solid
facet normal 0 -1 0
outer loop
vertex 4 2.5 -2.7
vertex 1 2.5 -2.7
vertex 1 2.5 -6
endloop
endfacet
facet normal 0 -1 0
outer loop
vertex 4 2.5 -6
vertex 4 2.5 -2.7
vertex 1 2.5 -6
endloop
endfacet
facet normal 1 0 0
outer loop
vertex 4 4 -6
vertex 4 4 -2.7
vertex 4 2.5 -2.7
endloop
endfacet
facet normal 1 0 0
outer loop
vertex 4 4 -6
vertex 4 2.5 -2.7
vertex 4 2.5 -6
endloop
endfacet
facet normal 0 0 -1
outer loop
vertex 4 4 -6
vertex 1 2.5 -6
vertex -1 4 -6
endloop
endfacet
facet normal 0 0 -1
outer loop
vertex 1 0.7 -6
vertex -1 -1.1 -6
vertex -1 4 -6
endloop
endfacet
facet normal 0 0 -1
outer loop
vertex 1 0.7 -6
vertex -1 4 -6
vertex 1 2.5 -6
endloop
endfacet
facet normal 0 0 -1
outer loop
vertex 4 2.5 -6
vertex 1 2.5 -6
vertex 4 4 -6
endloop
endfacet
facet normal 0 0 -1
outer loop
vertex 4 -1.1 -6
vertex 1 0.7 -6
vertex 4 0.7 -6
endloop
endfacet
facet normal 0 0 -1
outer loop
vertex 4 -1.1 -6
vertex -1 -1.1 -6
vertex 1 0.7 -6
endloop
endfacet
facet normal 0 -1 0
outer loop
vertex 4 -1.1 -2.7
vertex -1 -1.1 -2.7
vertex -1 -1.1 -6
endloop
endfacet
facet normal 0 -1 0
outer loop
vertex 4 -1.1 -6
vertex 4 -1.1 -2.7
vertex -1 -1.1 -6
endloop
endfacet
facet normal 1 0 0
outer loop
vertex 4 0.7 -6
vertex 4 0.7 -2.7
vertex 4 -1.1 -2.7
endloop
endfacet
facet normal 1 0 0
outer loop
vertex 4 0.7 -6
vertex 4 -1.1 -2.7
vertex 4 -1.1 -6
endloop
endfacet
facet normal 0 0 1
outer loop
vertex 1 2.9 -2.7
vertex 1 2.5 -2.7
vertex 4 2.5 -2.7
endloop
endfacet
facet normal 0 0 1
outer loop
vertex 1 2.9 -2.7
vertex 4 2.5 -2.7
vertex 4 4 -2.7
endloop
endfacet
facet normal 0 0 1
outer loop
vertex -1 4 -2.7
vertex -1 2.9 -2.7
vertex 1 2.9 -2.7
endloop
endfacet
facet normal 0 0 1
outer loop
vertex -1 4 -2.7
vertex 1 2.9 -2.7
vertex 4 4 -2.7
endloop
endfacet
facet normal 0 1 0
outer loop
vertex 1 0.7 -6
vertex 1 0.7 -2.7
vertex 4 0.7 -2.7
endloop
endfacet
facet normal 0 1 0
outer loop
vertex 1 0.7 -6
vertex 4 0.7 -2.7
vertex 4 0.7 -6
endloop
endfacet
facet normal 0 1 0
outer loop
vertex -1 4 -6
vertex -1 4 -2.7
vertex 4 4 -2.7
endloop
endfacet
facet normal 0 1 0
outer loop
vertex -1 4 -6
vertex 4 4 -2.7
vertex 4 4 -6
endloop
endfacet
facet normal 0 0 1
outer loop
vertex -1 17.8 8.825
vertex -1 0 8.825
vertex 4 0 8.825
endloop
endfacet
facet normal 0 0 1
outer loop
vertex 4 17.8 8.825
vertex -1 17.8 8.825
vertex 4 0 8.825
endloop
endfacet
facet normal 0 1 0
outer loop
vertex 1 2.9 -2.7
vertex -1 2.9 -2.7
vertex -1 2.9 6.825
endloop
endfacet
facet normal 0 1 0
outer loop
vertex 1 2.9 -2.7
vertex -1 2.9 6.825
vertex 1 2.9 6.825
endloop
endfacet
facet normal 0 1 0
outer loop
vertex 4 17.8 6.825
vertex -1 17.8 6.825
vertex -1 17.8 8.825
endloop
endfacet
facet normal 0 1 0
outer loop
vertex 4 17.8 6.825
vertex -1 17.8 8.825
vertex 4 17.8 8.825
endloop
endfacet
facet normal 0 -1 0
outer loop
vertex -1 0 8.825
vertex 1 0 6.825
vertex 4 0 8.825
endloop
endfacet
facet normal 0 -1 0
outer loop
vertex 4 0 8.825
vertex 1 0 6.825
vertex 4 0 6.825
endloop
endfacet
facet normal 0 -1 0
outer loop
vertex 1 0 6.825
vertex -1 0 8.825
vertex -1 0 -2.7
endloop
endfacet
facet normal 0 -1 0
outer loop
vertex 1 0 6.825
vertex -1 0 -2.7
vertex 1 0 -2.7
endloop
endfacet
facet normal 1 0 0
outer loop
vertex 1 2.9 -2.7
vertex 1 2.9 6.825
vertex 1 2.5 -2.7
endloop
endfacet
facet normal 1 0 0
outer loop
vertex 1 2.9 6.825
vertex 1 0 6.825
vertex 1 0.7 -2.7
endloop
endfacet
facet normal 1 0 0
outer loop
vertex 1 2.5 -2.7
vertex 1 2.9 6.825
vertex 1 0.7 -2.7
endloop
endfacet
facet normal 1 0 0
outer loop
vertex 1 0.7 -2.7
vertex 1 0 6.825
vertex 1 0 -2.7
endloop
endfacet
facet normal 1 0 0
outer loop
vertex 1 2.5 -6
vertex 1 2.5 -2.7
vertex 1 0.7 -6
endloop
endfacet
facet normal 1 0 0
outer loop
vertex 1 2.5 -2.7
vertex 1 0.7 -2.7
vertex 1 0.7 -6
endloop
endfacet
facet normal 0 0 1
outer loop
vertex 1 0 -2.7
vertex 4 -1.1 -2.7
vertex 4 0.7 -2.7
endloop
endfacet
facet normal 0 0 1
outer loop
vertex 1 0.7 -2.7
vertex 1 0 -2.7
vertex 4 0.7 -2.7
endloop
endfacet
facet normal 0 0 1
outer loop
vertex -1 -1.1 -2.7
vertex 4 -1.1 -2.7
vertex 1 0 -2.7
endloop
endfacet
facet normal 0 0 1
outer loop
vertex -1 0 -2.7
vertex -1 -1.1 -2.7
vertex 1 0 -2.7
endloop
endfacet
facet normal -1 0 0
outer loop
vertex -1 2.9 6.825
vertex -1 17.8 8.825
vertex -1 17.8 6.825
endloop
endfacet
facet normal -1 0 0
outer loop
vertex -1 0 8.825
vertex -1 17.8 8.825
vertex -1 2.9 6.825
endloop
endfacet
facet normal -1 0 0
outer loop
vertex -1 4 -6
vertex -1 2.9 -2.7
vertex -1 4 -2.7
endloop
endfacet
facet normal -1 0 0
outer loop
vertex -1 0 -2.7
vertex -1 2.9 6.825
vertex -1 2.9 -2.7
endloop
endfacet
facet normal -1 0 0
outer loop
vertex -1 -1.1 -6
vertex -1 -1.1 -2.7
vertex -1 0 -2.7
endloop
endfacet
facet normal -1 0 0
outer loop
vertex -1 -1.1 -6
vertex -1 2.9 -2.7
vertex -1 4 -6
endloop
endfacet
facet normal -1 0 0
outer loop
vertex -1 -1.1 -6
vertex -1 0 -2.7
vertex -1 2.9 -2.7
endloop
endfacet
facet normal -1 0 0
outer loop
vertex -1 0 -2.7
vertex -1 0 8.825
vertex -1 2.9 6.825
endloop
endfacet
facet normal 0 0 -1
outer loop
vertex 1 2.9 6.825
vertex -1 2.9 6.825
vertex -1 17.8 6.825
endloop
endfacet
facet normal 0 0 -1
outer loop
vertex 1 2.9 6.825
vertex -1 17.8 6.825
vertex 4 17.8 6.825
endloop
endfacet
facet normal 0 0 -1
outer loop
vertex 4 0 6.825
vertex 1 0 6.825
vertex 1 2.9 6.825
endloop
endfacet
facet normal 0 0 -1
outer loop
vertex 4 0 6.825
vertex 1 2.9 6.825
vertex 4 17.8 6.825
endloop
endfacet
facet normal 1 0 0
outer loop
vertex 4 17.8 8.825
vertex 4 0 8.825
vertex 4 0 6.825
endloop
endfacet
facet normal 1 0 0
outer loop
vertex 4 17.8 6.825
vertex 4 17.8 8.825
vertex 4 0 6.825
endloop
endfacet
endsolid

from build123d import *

# Parameters (mm, degrees)
SKETCH_1_W      = 2
SKETCH_1_H      = 12
EXTRUDE_1_DEPTH = 2.9
EXTRUDE_START   = -2
SKETCH_2_W      = 3.3
SKETCH_2_H      = 1.5
SKETCH_2_H_2    = 1.8
EXTRUDE_2_DEPTH = 5
SKETCH_3_W      = 10.525
SKETCH_3_H      = 2.9
EXTRUDE_3_DEPTH = 2
EXTRUDE_START_2 = -2.9
SKETCH_5_W      = 5
SKETCH_5_H      = 1
EXTRUDE_5_DEPTH = 17.8


with BuildPart() as part:
    # 草图1 → 凸台-拉伸1 (new body)
    with BuildSketch(Plane(origin=(0, 0, 0), x_dir=(1, 0, 0), z_dir=(0, 1, 0))):
        Rectangle(SKETCH_1_W, SKETCH_1_H)
    extrude(amount=EXTRUDE_1_DEPTH)

    # 草图2 → 凸台-拉伸2 (add)
    with BuildSketch(Plane(origin=(1, 0, 0), x_dir=(0, 0, -1), z_dir=(1, 0, 0)).offset(EXTRUDE_START)):
        with Locations((4.35, 3.25)):
            Rectangle(SKETCH_2_W, SKETCH_2_H)
        with Locations((4.35, -0.2)):
            Rectangle(SKETCH_2_W, SKETCH_2_H_2)
    extrude(amount=EXTRUDE_2_DEPTH)

    # 草图3 → 凸台-拉伸3 (add)
    with BuildSketch(Plane.ZY.offset(1)):
        with Locations((2.5625, 1.45)):
            Rectangle(SKETCH_3_W, SKETCH_3_H)
    extrude(amount=-EXTRUDE_3_DEPTH)

    # 草图5 → 凸台-拉伸5 (add)
    with BuildSketch(Plane(origin=(0, 2.9, 0), x_dir=(1, 0, 0), z_dir=(0, 1, 0)).offset(EXTRUDE_START_2)):
        with Locations((1.5, -7.325)):
            Rectangle(SKETCH_5_W, SKETCH_5_H)
        with Locations((1.5, -8.325)):
            Rectangle(SKETCH_5_W, SKETCH_5_H)
    extrude(amount=EXTRUDE_5_DEPTH)


solid = part.part
